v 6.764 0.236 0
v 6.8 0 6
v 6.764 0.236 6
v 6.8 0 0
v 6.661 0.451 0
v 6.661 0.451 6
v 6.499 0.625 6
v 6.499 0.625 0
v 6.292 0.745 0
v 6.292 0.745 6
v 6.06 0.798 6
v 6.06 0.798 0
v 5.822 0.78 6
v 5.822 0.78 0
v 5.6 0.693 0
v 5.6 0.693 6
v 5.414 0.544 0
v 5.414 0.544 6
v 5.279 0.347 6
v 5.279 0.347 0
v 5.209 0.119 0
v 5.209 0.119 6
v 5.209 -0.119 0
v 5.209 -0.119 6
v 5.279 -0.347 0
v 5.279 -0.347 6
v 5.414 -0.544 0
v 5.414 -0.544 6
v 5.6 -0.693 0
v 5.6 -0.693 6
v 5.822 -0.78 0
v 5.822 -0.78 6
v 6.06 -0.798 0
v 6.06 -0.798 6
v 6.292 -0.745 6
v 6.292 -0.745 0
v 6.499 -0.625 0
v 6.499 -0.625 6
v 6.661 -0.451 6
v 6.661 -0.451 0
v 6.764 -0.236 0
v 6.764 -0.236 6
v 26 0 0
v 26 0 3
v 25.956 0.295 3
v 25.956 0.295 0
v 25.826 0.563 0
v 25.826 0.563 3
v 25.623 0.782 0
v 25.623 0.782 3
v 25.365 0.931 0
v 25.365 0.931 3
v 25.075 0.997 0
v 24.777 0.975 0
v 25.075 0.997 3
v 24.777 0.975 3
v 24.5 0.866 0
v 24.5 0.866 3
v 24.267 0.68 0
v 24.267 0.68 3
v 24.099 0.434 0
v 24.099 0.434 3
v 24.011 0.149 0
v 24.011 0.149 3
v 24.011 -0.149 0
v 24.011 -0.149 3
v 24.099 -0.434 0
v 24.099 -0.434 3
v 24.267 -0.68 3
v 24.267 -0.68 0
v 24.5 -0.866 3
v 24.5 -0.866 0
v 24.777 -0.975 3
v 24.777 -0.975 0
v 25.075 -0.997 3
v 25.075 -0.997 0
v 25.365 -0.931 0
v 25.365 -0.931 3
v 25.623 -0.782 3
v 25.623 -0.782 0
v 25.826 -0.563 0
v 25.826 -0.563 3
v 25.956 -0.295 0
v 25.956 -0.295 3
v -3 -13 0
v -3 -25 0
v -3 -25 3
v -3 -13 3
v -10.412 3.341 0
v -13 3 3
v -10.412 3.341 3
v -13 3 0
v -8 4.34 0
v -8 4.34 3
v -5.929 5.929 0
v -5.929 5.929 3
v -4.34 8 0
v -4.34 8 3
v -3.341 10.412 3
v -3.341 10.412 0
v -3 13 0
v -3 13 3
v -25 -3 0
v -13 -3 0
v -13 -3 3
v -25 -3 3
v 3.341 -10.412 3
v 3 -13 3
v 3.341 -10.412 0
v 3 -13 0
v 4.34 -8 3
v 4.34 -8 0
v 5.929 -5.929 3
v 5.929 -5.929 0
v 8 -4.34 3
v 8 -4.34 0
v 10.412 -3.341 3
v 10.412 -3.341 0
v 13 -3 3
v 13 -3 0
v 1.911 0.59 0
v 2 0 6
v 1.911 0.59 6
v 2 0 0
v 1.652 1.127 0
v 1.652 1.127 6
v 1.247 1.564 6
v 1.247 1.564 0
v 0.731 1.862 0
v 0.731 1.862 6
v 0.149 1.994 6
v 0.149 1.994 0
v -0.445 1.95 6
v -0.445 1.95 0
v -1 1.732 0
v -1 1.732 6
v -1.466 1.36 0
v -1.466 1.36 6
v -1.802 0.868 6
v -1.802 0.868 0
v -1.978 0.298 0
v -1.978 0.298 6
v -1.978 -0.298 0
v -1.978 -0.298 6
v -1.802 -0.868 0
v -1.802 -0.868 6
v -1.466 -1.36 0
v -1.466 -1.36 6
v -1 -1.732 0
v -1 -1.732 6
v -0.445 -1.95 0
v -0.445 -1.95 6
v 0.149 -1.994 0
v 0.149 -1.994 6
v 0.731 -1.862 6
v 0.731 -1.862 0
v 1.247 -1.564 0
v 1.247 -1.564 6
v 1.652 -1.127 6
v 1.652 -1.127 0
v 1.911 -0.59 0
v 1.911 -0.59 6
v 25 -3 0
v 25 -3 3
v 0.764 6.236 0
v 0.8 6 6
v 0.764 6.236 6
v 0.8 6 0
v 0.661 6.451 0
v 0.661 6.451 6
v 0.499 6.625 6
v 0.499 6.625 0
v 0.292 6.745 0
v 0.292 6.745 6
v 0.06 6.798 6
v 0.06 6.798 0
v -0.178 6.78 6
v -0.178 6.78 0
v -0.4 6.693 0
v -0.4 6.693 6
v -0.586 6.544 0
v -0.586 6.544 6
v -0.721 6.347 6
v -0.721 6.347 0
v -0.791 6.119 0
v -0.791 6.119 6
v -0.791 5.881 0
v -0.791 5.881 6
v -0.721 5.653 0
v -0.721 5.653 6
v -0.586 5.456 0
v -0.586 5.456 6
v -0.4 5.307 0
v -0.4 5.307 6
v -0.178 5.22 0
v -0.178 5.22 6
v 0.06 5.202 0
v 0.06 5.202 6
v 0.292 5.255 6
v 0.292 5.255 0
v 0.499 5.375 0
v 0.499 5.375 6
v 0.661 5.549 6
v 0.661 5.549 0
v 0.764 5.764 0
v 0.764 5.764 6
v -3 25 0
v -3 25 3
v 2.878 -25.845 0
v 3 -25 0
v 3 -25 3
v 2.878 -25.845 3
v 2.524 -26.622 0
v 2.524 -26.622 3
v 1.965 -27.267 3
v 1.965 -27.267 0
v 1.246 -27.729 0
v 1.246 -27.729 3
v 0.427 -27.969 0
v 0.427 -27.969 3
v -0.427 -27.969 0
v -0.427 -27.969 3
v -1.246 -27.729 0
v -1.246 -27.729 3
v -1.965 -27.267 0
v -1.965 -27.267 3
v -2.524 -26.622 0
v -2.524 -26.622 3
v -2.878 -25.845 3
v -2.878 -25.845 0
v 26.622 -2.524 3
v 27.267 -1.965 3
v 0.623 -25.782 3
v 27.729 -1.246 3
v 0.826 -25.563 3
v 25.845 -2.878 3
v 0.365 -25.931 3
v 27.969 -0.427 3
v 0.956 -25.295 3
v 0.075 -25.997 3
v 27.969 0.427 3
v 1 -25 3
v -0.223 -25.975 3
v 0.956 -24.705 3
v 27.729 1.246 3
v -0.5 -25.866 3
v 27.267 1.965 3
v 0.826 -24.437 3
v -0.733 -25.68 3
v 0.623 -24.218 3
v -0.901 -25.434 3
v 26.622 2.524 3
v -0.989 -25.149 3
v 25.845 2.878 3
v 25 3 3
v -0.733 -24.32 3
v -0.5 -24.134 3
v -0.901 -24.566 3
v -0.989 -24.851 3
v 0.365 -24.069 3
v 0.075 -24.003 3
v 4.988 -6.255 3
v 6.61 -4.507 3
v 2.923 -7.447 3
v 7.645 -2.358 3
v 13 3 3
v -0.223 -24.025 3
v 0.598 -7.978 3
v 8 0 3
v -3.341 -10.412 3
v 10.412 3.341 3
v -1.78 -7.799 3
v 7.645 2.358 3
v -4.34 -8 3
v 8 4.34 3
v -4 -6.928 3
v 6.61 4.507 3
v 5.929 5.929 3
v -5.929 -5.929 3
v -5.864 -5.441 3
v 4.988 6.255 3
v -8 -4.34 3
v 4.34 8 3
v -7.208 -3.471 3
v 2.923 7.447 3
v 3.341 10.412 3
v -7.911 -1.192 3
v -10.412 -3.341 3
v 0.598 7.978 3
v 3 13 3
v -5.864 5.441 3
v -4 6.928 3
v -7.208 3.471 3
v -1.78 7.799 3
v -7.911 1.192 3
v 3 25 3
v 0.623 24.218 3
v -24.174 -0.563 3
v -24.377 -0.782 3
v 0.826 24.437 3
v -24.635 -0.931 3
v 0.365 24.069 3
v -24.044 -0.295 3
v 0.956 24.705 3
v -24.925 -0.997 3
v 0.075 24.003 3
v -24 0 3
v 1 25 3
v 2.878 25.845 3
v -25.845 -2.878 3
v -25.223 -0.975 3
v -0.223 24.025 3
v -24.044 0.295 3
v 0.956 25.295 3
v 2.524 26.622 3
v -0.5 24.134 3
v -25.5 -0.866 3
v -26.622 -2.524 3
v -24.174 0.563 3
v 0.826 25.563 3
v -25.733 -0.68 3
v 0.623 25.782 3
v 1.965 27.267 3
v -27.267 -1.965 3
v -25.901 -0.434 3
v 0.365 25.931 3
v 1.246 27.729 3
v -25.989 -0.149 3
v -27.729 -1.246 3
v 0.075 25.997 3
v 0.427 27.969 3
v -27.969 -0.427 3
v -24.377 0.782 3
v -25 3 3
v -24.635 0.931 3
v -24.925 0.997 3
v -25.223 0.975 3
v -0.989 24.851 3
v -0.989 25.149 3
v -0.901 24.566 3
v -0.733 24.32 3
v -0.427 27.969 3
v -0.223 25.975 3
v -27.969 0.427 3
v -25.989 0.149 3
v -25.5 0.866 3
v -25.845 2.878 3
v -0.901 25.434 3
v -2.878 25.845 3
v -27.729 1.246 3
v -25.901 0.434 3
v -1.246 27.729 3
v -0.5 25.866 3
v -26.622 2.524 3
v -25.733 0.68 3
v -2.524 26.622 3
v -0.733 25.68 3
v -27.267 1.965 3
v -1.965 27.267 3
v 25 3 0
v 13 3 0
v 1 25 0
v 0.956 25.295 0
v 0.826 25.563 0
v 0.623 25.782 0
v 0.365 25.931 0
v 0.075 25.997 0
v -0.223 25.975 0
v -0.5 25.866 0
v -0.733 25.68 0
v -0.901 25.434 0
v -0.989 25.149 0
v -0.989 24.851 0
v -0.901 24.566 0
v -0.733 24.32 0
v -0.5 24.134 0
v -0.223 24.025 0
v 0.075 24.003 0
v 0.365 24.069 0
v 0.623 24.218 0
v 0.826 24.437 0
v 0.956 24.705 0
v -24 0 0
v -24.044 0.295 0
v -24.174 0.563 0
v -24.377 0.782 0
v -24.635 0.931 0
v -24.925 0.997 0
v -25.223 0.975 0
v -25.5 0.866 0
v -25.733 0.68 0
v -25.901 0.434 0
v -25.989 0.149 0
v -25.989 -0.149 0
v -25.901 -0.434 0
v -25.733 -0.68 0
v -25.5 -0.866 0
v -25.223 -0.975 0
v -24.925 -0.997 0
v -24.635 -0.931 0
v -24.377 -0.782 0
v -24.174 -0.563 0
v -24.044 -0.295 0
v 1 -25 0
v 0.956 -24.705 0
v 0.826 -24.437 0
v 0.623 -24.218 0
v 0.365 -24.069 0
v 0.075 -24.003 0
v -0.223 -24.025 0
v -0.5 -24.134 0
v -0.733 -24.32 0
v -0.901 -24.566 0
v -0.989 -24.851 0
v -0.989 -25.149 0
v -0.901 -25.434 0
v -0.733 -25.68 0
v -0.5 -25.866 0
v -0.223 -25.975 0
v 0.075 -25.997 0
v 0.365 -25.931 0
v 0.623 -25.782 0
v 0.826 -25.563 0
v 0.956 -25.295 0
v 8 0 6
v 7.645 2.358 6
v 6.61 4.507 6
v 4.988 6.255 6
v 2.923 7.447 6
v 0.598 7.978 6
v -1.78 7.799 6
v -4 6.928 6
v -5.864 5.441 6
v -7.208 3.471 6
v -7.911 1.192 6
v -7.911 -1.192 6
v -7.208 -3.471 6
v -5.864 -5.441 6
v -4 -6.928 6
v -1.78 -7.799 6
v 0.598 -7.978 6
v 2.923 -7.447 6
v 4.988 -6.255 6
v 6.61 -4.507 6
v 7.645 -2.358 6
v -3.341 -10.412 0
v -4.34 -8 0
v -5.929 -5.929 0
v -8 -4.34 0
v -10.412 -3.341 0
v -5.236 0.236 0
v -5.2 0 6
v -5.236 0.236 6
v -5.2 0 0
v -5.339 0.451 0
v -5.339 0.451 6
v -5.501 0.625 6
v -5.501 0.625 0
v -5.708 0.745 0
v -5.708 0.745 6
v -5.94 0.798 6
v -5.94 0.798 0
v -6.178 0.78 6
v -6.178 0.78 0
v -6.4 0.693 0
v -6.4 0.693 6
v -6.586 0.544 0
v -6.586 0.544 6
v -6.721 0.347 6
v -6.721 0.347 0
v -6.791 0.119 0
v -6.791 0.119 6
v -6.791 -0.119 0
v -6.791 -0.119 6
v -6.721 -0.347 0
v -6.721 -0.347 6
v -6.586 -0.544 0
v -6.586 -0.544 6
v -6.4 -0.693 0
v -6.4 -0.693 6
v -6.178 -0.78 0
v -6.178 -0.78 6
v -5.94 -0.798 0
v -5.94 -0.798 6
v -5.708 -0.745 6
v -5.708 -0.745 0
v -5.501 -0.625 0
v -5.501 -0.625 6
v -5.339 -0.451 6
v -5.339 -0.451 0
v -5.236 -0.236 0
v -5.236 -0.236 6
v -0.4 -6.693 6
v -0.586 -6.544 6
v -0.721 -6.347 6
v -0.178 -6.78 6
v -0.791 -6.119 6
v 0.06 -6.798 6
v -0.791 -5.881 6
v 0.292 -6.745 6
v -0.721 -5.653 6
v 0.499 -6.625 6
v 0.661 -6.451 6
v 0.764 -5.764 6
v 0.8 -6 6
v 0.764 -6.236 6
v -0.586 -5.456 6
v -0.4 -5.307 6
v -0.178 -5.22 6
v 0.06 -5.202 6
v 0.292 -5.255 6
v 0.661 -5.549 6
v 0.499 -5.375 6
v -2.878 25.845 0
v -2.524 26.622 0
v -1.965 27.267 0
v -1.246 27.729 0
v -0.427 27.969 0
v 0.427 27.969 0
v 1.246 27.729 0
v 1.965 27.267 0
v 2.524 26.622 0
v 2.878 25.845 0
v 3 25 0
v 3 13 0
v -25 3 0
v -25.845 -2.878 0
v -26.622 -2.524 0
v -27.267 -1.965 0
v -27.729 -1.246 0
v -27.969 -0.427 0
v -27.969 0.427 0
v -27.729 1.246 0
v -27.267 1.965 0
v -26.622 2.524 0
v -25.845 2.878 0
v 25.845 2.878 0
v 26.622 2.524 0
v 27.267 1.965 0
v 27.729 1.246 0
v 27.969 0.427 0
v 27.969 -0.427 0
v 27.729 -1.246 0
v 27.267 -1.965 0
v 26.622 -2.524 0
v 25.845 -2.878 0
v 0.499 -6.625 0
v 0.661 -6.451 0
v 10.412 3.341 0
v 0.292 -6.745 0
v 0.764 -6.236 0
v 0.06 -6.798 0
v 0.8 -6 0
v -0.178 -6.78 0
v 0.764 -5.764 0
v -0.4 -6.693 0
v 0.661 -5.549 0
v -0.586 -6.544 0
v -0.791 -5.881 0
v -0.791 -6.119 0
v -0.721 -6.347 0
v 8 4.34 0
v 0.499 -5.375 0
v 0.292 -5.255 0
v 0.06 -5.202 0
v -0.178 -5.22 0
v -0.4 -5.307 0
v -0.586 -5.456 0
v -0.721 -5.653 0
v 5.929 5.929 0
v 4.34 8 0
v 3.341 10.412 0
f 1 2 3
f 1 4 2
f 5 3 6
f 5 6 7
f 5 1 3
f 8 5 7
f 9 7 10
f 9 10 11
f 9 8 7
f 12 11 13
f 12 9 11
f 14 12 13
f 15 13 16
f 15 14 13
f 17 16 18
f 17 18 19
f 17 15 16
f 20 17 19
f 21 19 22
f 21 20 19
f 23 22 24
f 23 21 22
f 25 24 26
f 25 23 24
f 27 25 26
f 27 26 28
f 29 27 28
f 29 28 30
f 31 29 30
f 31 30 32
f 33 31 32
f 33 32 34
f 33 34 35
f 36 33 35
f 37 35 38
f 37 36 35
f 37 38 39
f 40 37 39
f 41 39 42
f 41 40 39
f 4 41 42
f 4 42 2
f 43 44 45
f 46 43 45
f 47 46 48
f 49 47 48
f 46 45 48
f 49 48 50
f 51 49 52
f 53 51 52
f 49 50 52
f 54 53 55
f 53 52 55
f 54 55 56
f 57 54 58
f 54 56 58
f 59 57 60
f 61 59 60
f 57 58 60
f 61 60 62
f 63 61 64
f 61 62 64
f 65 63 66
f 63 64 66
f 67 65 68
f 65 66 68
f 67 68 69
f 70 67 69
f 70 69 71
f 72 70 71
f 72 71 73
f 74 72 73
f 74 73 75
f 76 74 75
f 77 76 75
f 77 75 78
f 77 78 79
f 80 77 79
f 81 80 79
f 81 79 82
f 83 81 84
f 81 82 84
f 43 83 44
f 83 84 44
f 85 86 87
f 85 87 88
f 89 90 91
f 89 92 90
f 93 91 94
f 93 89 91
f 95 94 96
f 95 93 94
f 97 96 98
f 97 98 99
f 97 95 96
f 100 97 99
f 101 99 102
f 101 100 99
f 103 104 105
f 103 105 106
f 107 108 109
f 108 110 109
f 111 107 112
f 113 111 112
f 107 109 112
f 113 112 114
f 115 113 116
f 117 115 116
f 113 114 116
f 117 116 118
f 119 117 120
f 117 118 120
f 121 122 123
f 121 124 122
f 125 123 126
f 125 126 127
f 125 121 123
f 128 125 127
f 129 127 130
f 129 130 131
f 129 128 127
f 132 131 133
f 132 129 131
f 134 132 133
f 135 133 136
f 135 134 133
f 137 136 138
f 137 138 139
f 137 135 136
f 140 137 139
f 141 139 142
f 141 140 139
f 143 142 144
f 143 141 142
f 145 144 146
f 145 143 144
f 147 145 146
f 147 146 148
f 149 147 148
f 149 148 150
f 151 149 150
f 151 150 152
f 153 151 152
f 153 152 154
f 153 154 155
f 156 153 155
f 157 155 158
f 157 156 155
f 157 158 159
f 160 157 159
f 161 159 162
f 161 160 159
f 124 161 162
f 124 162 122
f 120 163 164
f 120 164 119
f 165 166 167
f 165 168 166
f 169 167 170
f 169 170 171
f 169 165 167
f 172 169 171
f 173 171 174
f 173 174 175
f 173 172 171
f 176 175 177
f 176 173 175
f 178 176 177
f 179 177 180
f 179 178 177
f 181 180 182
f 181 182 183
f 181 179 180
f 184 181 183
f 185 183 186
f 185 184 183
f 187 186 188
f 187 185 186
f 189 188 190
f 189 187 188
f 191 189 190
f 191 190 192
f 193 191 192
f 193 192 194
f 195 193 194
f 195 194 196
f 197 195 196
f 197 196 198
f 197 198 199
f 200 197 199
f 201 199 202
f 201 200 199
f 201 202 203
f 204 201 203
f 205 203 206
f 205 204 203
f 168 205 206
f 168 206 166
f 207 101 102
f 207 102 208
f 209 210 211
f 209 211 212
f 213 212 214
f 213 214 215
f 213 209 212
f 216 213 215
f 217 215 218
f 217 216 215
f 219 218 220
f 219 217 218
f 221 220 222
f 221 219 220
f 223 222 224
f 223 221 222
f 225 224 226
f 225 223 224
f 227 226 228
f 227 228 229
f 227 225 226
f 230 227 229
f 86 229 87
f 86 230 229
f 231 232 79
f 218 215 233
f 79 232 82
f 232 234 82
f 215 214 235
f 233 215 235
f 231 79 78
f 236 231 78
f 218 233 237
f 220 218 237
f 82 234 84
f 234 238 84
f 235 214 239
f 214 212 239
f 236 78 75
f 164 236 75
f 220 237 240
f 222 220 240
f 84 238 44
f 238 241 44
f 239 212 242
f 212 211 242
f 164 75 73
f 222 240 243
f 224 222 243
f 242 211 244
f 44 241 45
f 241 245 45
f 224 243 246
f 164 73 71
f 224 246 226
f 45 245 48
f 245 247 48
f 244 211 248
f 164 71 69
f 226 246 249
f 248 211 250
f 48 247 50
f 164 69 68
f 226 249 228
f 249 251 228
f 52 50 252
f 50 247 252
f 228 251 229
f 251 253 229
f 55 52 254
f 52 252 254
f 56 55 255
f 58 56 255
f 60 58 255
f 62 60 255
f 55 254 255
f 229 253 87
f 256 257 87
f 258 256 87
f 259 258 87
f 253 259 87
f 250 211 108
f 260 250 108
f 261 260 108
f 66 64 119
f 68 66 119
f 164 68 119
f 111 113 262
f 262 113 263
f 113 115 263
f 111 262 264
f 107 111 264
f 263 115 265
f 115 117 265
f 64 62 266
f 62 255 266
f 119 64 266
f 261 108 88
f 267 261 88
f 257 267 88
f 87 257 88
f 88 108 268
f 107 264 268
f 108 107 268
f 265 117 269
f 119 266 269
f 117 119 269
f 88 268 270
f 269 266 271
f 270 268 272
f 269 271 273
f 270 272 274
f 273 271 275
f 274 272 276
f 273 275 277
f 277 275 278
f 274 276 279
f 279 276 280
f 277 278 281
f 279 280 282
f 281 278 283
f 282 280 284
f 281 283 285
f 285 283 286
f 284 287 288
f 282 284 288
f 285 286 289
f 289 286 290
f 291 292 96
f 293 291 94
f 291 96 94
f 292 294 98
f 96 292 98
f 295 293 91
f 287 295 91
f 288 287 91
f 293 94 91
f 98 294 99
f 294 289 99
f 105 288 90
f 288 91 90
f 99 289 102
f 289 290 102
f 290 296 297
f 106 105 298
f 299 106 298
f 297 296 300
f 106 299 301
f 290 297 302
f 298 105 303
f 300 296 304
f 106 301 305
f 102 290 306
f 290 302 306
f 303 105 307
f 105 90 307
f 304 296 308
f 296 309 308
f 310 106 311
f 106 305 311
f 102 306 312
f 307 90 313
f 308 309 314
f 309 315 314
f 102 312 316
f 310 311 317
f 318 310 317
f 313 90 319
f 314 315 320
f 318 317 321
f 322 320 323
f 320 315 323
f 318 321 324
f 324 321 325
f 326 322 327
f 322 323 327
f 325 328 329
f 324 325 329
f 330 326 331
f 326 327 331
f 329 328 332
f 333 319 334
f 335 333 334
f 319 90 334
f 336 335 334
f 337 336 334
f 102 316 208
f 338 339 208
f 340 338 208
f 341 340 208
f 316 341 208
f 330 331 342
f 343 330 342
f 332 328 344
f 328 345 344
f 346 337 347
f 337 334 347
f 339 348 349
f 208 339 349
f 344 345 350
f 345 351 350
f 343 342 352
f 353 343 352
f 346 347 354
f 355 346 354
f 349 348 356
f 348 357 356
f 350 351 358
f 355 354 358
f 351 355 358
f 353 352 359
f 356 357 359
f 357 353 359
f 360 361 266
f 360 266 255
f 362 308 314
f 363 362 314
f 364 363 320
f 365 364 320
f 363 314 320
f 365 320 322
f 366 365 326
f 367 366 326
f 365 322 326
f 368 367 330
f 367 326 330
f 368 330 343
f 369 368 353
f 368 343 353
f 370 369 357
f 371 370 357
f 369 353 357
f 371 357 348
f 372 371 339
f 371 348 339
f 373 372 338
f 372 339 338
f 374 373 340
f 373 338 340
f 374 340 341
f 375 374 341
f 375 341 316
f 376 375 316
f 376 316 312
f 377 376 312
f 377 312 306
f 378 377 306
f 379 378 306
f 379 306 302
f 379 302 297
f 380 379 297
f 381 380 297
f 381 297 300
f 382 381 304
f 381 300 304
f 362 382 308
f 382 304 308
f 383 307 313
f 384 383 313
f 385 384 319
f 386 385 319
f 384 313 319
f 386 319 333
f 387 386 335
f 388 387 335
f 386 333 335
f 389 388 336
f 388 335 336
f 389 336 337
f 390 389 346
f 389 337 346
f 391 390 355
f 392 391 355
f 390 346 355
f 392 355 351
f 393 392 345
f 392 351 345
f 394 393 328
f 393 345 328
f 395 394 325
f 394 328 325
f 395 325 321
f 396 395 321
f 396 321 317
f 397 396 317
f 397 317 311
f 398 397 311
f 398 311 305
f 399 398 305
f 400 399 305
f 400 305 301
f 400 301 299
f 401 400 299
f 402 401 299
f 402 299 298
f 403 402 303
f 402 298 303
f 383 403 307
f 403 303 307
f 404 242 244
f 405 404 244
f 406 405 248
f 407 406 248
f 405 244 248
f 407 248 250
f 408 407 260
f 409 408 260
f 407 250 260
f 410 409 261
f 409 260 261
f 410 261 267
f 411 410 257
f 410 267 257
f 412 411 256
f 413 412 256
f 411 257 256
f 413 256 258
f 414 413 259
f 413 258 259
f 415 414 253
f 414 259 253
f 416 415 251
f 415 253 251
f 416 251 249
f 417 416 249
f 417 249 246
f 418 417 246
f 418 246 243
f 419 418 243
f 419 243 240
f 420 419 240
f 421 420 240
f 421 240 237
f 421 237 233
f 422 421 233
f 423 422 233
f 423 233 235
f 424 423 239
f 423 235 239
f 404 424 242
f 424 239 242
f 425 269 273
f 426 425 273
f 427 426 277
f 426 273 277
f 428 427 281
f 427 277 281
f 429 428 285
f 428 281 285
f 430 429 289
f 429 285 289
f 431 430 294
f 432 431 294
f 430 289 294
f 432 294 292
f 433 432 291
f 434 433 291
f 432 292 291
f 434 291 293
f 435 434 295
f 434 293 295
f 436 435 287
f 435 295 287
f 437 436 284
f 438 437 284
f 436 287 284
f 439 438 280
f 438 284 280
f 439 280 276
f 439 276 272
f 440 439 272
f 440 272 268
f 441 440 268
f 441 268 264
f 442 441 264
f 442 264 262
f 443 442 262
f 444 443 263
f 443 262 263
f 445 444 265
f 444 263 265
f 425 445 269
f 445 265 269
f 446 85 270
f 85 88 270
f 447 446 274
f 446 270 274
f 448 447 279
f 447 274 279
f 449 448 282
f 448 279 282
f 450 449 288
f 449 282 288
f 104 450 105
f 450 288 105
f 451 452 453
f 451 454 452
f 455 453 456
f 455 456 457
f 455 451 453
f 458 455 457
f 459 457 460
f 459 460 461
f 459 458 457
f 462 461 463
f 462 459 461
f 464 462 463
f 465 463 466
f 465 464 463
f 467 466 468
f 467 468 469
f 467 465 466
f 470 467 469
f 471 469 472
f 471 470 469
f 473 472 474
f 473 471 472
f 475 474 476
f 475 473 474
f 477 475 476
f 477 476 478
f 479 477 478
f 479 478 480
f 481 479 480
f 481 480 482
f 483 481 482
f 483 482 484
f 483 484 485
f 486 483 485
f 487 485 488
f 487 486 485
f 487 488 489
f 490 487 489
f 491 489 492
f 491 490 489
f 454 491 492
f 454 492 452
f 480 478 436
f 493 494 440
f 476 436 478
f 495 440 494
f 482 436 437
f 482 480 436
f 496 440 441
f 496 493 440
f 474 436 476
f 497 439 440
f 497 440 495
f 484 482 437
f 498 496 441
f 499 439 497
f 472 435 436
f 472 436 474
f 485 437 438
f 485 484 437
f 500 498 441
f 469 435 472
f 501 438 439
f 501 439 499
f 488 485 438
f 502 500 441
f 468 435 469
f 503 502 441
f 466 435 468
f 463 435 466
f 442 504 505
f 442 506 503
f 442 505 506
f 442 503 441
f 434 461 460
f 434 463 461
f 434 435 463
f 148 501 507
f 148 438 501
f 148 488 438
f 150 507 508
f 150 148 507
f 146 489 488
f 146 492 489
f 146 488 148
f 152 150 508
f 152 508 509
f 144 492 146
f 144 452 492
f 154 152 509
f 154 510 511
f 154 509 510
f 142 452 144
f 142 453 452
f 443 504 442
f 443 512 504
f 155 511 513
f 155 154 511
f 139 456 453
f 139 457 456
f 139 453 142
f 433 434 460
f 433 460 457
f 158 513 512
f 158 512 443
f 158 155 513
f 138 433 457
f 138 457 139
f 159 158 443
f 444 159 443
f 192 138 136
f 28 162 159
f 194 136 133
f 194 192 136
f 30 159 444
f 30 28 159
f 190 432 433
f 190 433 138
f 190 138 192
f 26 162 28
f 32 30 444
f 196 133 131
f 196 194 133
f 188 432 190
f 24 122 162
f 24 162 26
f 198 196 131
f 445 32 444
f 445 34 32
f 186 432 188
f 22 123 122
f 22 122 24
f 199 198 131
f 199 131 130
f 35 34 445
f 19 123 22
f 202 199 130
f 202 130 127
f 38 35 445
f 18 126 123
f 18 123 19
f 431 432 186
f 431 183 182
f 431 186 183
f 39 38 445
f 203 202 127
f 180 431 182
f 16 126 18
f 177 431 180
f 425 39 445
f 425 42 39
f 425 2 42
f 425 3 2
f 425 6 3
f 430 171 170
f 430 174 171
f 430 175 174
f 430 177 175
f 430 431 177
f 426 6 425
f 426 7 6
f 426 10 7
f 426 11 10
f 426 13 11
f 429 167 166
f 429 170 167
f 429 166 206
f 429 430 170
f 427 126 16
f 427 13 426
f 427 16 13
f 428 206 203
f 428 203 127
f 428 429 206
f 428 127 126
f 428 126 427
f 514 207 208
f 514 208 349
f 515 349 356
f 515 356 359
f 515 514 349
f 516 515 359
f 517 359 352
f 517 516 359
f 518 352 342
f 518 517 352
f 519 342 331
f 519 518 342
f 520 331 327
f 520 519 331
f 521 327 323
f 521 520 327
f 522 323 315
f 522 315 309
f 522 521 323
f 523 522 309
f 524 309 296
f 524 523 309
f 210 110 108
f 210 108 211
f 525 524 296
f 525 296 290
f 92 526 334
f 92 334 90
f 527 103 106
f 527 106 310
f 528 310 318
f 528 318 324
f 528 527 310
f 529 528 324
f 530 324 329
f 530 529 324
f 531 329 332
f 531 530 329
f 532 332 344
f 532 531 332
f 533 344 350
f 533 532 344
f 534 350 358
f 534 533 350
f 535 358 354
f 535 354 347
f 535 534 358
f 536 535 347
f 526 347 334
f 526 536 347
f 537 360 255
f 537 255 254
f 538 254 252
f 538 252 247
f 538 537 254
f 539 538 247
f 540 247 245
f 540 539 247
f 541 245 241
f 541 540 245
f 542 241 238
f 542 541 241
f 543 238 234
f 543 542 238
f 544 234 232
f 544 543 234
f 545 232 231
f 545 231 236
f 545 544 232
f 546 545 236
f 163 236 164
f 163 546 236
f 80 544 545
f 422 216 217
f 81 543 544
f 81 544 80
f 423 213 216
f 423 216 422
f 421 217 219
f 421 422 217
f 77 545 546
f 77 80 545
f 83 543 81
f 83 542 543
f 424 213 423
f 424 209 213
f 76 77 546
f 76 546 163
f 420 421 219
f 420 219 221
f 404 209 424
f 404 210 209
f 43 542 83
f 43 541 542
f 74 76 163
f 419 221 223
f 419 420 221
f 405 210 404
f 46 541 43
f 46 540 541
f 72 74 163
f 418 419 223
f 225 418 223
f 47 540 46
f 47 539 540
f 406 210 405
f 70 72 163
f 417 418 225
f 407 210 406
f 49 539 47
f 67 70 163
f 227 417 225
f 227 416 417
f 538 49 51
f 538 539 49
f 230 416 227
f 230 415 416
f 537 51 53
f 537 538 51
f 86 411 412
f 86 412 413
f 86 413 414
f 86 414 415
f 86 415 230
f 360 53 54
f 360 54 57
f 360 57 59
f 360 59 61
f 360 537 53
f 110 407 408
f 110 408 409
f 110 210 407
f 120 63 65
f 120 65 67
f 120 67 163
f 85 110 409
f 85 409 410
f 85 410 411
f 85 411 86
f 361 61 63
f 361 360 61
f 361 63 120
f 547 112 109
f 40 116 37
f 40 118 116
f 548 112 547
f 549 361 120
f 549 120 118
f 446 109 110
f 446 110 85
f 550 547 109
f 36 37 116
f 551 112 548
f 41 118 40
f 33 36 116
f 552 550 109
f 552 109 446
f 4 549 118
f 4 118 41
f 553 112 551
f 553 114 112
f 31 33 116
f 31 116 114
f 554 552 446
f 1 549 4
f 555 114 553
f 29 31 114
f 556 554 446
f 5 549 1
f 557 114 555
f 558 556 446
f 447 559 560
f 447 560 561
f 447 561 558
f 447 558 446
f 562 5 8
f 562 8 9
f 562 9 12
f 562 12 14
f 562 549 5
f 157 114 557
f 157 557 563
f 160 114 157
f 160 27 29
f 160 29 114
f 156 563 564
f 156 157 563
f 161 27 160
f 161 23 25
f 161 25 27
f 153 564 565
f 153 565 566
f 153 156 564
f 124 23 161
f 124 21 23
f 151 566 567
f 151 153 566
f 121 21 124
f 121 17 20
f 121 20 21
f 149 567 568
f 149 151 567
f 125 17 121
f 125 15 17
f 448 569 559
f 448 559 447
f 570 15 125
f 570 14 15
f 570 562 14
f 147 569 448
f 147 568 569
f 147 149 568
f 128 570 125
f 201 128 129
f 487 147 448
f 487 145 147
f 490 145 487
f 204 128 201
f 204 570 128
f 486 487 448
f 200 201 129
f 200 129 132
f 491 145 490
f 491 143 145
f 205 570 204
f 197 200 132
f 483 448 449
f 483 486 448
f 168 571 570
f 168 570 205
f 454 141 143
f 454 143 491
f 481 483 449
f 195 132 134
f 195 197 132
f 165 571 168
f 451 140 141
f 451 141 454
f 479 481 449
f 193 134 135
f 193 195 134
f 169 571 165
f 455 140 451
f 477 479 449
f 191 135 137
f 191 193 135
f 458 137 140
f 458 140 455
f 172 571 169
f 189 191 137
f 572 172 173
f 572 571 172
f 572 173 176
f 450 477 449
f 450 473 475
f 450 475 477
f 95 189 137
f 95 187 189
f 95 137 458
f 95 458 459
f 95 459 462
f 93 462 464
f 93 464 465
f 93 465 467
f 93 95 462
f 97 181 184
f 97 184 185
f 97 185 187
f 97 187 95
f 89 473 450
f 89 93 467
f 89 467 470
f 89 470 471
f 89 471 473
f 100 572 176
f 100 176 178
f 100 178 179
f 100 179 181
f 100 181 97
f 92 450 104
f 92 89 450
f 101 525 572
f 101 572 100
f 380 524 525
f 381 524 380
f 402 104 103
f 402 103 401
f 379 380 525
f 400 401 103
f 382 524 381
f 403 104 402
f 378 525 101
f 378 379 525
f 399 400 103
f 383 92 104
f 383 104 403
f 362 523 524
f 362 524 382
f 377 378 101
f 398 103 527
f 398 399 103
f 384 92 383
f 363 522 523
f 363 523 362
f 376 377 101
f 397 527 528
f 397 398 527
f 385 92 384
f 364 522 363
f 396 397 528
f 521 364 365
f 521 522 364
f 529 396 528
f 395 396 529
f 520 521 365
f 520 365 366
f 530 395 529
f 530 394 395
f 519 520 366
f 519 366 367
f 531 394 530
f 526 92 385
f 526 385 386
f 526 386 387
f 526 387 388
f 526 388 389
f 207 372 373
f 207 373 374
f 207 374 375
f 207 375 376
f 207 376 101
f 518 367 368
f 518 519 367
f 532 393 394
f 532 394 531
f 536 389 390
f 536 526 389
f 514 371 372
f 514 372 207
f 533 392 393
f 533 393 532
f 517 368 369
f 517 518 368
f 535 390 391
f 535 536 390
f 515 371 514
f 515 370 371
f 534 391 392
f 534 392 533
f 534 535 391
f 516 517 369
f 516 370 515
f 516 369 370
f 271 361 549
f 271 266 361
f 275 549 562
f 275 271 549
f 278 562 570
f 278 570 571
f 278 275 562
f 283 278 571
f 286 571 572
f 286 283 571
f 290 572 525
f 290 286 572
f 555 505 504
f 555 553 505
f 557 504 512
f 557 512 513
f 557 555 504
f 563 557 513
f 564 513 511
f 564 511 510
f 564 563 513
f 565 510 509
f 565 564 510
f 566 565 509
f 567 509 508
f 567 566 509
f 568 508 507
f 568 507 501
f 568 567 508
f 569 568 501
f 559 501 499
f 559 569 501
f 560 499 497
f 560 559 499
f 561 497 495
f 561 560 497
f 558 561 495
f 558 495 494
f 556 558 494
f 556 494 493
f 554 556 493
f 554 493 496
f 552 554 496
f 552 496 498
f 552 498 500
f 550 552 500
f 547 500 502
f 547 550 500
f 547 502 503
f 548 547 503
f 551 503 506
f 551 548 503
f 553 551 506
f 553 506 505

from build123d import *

# Parameters (mm, degrees)
SKETCH1_R           = 0.8
BOSS_EXTRUDE1_DEPTH = 3
FILLET1_R           = 10
SKETCH2_R           = 2
CUT_EXTRUDE1_DEPTH  = 3
SKETCH3_R           = 8
SKETCH3_R_2         = 2
SKETCH3_R_3         = 0.8
BOSS_EXTRUDE2_DEPTH = 3
SKETCH4_R           = 1
CUT_EXTRUDE2_DEPTH  = 3


with BuildPart() as part:
    # Sketch1 → Boss-Extrude1 (new body)
    # profile 1 of 2: a face of its own
    with BuildSketch(Plane.XY):
        with BuildLine():
            Line((25, -3), (-25, -3))
            ThreePointArc((-25, -3), (-28, 0), (-25, 3))
            Line((-25, 3), (25, 3))
            ThreePointArc((25, 3), (28, 0), (25, -3))
        make_face()
        with Locations((-6, 0)):
            Circle(SKETCH1_R, mode=Mode.SUBTRACT)
        with Locations((6, 0)):
            Circle(SKETCH1_R, mode=Mode.SUBTRACT)
    # profile 2 of 2: a face of its own
    with BuildSketch(Plane.XY):
        with BuildLine():
            Line((-3, -25), (-3, 25))
            ThreePointArc((-3, 25), (0, 28), (3, 25))
            Line((3, 25), (3, -25))
            ThreePointArc((3, -25), (0, -28), (-3, -25))
        make_face()
        with Locations((0, 6)):
            Circle(SKETCH1_R, mode=Mode.SUBTRACT)
        with Locations((0, -6)):
            Circle(SKETCH1_R, mode=Mode.SUBTRACT)
    extrude(amount=BOSS_EXTRUDE1_DEPTH)

    # Fillet1
    fillet1_edges = [part.edges().sort_by_distance(p)[0] for p in [
        (3, -3, 1.5),
        (-3, -3, 1.5),
        (-3, 3, 1.5),
        (3, 3, 1.5),
    ]]
    fillet(fillet1_edges, radius=FILLET1_R)

    # Sketch2 → Cut-Extrude1 (cut)
    with BuildSketch(Plane.XY.offset(3)):
        Circle(SKETCH2_R)
    extrude(amount=-CUT_EXTRUDE1_DEPTH, mode=Mode.SUBTRACT)

    # Sketch3 → Boss-Extrude2 (add)
    with BuildSketch(Plane.XY.offset(3)):
        Circle(SKETCH3_R)
        Circle(SKETCH3_R_2, mode=Mode.SUBTRACT)
        with Locations((0, 6)):
            Circle(SKETCH3_R_3, mode=Mode.SUBTRACT)
        with Locations((6, 0)):
            Circle(SKETCH3_R_3, mode=Mode.SUBTRACT)
        with Locations((0, -6)):
            Circle(SKETCH3_R_3, mode=Mode.SUBTRACT)
        with Locations((-6, 0)):
            Circle(SKETCH3_R_3, mode=Mode.SUBTRACT)
    extrude(amount=BOSS_EXTRUDE2_DEPTH)

    # Sketch4 → Cut-Extrude2 (cut)
    with BuildSketch(Plane.XY.offset(3)):
        with Locations((0, 25)):
            Circle(SKETCH4_R)
        with Locations((25, 0)):
            Circle(SKETCH4_R)
        with Locations((0, -25)):
            Circle(SKETCH4_R)
        with Locations((-25, 0)):
            Circle(SKETCH4_R)
    extrude(amount=-CUT_EXTRUDE2_DEPTH, mode=Mode.SUBTRACT)


solid = part.part
